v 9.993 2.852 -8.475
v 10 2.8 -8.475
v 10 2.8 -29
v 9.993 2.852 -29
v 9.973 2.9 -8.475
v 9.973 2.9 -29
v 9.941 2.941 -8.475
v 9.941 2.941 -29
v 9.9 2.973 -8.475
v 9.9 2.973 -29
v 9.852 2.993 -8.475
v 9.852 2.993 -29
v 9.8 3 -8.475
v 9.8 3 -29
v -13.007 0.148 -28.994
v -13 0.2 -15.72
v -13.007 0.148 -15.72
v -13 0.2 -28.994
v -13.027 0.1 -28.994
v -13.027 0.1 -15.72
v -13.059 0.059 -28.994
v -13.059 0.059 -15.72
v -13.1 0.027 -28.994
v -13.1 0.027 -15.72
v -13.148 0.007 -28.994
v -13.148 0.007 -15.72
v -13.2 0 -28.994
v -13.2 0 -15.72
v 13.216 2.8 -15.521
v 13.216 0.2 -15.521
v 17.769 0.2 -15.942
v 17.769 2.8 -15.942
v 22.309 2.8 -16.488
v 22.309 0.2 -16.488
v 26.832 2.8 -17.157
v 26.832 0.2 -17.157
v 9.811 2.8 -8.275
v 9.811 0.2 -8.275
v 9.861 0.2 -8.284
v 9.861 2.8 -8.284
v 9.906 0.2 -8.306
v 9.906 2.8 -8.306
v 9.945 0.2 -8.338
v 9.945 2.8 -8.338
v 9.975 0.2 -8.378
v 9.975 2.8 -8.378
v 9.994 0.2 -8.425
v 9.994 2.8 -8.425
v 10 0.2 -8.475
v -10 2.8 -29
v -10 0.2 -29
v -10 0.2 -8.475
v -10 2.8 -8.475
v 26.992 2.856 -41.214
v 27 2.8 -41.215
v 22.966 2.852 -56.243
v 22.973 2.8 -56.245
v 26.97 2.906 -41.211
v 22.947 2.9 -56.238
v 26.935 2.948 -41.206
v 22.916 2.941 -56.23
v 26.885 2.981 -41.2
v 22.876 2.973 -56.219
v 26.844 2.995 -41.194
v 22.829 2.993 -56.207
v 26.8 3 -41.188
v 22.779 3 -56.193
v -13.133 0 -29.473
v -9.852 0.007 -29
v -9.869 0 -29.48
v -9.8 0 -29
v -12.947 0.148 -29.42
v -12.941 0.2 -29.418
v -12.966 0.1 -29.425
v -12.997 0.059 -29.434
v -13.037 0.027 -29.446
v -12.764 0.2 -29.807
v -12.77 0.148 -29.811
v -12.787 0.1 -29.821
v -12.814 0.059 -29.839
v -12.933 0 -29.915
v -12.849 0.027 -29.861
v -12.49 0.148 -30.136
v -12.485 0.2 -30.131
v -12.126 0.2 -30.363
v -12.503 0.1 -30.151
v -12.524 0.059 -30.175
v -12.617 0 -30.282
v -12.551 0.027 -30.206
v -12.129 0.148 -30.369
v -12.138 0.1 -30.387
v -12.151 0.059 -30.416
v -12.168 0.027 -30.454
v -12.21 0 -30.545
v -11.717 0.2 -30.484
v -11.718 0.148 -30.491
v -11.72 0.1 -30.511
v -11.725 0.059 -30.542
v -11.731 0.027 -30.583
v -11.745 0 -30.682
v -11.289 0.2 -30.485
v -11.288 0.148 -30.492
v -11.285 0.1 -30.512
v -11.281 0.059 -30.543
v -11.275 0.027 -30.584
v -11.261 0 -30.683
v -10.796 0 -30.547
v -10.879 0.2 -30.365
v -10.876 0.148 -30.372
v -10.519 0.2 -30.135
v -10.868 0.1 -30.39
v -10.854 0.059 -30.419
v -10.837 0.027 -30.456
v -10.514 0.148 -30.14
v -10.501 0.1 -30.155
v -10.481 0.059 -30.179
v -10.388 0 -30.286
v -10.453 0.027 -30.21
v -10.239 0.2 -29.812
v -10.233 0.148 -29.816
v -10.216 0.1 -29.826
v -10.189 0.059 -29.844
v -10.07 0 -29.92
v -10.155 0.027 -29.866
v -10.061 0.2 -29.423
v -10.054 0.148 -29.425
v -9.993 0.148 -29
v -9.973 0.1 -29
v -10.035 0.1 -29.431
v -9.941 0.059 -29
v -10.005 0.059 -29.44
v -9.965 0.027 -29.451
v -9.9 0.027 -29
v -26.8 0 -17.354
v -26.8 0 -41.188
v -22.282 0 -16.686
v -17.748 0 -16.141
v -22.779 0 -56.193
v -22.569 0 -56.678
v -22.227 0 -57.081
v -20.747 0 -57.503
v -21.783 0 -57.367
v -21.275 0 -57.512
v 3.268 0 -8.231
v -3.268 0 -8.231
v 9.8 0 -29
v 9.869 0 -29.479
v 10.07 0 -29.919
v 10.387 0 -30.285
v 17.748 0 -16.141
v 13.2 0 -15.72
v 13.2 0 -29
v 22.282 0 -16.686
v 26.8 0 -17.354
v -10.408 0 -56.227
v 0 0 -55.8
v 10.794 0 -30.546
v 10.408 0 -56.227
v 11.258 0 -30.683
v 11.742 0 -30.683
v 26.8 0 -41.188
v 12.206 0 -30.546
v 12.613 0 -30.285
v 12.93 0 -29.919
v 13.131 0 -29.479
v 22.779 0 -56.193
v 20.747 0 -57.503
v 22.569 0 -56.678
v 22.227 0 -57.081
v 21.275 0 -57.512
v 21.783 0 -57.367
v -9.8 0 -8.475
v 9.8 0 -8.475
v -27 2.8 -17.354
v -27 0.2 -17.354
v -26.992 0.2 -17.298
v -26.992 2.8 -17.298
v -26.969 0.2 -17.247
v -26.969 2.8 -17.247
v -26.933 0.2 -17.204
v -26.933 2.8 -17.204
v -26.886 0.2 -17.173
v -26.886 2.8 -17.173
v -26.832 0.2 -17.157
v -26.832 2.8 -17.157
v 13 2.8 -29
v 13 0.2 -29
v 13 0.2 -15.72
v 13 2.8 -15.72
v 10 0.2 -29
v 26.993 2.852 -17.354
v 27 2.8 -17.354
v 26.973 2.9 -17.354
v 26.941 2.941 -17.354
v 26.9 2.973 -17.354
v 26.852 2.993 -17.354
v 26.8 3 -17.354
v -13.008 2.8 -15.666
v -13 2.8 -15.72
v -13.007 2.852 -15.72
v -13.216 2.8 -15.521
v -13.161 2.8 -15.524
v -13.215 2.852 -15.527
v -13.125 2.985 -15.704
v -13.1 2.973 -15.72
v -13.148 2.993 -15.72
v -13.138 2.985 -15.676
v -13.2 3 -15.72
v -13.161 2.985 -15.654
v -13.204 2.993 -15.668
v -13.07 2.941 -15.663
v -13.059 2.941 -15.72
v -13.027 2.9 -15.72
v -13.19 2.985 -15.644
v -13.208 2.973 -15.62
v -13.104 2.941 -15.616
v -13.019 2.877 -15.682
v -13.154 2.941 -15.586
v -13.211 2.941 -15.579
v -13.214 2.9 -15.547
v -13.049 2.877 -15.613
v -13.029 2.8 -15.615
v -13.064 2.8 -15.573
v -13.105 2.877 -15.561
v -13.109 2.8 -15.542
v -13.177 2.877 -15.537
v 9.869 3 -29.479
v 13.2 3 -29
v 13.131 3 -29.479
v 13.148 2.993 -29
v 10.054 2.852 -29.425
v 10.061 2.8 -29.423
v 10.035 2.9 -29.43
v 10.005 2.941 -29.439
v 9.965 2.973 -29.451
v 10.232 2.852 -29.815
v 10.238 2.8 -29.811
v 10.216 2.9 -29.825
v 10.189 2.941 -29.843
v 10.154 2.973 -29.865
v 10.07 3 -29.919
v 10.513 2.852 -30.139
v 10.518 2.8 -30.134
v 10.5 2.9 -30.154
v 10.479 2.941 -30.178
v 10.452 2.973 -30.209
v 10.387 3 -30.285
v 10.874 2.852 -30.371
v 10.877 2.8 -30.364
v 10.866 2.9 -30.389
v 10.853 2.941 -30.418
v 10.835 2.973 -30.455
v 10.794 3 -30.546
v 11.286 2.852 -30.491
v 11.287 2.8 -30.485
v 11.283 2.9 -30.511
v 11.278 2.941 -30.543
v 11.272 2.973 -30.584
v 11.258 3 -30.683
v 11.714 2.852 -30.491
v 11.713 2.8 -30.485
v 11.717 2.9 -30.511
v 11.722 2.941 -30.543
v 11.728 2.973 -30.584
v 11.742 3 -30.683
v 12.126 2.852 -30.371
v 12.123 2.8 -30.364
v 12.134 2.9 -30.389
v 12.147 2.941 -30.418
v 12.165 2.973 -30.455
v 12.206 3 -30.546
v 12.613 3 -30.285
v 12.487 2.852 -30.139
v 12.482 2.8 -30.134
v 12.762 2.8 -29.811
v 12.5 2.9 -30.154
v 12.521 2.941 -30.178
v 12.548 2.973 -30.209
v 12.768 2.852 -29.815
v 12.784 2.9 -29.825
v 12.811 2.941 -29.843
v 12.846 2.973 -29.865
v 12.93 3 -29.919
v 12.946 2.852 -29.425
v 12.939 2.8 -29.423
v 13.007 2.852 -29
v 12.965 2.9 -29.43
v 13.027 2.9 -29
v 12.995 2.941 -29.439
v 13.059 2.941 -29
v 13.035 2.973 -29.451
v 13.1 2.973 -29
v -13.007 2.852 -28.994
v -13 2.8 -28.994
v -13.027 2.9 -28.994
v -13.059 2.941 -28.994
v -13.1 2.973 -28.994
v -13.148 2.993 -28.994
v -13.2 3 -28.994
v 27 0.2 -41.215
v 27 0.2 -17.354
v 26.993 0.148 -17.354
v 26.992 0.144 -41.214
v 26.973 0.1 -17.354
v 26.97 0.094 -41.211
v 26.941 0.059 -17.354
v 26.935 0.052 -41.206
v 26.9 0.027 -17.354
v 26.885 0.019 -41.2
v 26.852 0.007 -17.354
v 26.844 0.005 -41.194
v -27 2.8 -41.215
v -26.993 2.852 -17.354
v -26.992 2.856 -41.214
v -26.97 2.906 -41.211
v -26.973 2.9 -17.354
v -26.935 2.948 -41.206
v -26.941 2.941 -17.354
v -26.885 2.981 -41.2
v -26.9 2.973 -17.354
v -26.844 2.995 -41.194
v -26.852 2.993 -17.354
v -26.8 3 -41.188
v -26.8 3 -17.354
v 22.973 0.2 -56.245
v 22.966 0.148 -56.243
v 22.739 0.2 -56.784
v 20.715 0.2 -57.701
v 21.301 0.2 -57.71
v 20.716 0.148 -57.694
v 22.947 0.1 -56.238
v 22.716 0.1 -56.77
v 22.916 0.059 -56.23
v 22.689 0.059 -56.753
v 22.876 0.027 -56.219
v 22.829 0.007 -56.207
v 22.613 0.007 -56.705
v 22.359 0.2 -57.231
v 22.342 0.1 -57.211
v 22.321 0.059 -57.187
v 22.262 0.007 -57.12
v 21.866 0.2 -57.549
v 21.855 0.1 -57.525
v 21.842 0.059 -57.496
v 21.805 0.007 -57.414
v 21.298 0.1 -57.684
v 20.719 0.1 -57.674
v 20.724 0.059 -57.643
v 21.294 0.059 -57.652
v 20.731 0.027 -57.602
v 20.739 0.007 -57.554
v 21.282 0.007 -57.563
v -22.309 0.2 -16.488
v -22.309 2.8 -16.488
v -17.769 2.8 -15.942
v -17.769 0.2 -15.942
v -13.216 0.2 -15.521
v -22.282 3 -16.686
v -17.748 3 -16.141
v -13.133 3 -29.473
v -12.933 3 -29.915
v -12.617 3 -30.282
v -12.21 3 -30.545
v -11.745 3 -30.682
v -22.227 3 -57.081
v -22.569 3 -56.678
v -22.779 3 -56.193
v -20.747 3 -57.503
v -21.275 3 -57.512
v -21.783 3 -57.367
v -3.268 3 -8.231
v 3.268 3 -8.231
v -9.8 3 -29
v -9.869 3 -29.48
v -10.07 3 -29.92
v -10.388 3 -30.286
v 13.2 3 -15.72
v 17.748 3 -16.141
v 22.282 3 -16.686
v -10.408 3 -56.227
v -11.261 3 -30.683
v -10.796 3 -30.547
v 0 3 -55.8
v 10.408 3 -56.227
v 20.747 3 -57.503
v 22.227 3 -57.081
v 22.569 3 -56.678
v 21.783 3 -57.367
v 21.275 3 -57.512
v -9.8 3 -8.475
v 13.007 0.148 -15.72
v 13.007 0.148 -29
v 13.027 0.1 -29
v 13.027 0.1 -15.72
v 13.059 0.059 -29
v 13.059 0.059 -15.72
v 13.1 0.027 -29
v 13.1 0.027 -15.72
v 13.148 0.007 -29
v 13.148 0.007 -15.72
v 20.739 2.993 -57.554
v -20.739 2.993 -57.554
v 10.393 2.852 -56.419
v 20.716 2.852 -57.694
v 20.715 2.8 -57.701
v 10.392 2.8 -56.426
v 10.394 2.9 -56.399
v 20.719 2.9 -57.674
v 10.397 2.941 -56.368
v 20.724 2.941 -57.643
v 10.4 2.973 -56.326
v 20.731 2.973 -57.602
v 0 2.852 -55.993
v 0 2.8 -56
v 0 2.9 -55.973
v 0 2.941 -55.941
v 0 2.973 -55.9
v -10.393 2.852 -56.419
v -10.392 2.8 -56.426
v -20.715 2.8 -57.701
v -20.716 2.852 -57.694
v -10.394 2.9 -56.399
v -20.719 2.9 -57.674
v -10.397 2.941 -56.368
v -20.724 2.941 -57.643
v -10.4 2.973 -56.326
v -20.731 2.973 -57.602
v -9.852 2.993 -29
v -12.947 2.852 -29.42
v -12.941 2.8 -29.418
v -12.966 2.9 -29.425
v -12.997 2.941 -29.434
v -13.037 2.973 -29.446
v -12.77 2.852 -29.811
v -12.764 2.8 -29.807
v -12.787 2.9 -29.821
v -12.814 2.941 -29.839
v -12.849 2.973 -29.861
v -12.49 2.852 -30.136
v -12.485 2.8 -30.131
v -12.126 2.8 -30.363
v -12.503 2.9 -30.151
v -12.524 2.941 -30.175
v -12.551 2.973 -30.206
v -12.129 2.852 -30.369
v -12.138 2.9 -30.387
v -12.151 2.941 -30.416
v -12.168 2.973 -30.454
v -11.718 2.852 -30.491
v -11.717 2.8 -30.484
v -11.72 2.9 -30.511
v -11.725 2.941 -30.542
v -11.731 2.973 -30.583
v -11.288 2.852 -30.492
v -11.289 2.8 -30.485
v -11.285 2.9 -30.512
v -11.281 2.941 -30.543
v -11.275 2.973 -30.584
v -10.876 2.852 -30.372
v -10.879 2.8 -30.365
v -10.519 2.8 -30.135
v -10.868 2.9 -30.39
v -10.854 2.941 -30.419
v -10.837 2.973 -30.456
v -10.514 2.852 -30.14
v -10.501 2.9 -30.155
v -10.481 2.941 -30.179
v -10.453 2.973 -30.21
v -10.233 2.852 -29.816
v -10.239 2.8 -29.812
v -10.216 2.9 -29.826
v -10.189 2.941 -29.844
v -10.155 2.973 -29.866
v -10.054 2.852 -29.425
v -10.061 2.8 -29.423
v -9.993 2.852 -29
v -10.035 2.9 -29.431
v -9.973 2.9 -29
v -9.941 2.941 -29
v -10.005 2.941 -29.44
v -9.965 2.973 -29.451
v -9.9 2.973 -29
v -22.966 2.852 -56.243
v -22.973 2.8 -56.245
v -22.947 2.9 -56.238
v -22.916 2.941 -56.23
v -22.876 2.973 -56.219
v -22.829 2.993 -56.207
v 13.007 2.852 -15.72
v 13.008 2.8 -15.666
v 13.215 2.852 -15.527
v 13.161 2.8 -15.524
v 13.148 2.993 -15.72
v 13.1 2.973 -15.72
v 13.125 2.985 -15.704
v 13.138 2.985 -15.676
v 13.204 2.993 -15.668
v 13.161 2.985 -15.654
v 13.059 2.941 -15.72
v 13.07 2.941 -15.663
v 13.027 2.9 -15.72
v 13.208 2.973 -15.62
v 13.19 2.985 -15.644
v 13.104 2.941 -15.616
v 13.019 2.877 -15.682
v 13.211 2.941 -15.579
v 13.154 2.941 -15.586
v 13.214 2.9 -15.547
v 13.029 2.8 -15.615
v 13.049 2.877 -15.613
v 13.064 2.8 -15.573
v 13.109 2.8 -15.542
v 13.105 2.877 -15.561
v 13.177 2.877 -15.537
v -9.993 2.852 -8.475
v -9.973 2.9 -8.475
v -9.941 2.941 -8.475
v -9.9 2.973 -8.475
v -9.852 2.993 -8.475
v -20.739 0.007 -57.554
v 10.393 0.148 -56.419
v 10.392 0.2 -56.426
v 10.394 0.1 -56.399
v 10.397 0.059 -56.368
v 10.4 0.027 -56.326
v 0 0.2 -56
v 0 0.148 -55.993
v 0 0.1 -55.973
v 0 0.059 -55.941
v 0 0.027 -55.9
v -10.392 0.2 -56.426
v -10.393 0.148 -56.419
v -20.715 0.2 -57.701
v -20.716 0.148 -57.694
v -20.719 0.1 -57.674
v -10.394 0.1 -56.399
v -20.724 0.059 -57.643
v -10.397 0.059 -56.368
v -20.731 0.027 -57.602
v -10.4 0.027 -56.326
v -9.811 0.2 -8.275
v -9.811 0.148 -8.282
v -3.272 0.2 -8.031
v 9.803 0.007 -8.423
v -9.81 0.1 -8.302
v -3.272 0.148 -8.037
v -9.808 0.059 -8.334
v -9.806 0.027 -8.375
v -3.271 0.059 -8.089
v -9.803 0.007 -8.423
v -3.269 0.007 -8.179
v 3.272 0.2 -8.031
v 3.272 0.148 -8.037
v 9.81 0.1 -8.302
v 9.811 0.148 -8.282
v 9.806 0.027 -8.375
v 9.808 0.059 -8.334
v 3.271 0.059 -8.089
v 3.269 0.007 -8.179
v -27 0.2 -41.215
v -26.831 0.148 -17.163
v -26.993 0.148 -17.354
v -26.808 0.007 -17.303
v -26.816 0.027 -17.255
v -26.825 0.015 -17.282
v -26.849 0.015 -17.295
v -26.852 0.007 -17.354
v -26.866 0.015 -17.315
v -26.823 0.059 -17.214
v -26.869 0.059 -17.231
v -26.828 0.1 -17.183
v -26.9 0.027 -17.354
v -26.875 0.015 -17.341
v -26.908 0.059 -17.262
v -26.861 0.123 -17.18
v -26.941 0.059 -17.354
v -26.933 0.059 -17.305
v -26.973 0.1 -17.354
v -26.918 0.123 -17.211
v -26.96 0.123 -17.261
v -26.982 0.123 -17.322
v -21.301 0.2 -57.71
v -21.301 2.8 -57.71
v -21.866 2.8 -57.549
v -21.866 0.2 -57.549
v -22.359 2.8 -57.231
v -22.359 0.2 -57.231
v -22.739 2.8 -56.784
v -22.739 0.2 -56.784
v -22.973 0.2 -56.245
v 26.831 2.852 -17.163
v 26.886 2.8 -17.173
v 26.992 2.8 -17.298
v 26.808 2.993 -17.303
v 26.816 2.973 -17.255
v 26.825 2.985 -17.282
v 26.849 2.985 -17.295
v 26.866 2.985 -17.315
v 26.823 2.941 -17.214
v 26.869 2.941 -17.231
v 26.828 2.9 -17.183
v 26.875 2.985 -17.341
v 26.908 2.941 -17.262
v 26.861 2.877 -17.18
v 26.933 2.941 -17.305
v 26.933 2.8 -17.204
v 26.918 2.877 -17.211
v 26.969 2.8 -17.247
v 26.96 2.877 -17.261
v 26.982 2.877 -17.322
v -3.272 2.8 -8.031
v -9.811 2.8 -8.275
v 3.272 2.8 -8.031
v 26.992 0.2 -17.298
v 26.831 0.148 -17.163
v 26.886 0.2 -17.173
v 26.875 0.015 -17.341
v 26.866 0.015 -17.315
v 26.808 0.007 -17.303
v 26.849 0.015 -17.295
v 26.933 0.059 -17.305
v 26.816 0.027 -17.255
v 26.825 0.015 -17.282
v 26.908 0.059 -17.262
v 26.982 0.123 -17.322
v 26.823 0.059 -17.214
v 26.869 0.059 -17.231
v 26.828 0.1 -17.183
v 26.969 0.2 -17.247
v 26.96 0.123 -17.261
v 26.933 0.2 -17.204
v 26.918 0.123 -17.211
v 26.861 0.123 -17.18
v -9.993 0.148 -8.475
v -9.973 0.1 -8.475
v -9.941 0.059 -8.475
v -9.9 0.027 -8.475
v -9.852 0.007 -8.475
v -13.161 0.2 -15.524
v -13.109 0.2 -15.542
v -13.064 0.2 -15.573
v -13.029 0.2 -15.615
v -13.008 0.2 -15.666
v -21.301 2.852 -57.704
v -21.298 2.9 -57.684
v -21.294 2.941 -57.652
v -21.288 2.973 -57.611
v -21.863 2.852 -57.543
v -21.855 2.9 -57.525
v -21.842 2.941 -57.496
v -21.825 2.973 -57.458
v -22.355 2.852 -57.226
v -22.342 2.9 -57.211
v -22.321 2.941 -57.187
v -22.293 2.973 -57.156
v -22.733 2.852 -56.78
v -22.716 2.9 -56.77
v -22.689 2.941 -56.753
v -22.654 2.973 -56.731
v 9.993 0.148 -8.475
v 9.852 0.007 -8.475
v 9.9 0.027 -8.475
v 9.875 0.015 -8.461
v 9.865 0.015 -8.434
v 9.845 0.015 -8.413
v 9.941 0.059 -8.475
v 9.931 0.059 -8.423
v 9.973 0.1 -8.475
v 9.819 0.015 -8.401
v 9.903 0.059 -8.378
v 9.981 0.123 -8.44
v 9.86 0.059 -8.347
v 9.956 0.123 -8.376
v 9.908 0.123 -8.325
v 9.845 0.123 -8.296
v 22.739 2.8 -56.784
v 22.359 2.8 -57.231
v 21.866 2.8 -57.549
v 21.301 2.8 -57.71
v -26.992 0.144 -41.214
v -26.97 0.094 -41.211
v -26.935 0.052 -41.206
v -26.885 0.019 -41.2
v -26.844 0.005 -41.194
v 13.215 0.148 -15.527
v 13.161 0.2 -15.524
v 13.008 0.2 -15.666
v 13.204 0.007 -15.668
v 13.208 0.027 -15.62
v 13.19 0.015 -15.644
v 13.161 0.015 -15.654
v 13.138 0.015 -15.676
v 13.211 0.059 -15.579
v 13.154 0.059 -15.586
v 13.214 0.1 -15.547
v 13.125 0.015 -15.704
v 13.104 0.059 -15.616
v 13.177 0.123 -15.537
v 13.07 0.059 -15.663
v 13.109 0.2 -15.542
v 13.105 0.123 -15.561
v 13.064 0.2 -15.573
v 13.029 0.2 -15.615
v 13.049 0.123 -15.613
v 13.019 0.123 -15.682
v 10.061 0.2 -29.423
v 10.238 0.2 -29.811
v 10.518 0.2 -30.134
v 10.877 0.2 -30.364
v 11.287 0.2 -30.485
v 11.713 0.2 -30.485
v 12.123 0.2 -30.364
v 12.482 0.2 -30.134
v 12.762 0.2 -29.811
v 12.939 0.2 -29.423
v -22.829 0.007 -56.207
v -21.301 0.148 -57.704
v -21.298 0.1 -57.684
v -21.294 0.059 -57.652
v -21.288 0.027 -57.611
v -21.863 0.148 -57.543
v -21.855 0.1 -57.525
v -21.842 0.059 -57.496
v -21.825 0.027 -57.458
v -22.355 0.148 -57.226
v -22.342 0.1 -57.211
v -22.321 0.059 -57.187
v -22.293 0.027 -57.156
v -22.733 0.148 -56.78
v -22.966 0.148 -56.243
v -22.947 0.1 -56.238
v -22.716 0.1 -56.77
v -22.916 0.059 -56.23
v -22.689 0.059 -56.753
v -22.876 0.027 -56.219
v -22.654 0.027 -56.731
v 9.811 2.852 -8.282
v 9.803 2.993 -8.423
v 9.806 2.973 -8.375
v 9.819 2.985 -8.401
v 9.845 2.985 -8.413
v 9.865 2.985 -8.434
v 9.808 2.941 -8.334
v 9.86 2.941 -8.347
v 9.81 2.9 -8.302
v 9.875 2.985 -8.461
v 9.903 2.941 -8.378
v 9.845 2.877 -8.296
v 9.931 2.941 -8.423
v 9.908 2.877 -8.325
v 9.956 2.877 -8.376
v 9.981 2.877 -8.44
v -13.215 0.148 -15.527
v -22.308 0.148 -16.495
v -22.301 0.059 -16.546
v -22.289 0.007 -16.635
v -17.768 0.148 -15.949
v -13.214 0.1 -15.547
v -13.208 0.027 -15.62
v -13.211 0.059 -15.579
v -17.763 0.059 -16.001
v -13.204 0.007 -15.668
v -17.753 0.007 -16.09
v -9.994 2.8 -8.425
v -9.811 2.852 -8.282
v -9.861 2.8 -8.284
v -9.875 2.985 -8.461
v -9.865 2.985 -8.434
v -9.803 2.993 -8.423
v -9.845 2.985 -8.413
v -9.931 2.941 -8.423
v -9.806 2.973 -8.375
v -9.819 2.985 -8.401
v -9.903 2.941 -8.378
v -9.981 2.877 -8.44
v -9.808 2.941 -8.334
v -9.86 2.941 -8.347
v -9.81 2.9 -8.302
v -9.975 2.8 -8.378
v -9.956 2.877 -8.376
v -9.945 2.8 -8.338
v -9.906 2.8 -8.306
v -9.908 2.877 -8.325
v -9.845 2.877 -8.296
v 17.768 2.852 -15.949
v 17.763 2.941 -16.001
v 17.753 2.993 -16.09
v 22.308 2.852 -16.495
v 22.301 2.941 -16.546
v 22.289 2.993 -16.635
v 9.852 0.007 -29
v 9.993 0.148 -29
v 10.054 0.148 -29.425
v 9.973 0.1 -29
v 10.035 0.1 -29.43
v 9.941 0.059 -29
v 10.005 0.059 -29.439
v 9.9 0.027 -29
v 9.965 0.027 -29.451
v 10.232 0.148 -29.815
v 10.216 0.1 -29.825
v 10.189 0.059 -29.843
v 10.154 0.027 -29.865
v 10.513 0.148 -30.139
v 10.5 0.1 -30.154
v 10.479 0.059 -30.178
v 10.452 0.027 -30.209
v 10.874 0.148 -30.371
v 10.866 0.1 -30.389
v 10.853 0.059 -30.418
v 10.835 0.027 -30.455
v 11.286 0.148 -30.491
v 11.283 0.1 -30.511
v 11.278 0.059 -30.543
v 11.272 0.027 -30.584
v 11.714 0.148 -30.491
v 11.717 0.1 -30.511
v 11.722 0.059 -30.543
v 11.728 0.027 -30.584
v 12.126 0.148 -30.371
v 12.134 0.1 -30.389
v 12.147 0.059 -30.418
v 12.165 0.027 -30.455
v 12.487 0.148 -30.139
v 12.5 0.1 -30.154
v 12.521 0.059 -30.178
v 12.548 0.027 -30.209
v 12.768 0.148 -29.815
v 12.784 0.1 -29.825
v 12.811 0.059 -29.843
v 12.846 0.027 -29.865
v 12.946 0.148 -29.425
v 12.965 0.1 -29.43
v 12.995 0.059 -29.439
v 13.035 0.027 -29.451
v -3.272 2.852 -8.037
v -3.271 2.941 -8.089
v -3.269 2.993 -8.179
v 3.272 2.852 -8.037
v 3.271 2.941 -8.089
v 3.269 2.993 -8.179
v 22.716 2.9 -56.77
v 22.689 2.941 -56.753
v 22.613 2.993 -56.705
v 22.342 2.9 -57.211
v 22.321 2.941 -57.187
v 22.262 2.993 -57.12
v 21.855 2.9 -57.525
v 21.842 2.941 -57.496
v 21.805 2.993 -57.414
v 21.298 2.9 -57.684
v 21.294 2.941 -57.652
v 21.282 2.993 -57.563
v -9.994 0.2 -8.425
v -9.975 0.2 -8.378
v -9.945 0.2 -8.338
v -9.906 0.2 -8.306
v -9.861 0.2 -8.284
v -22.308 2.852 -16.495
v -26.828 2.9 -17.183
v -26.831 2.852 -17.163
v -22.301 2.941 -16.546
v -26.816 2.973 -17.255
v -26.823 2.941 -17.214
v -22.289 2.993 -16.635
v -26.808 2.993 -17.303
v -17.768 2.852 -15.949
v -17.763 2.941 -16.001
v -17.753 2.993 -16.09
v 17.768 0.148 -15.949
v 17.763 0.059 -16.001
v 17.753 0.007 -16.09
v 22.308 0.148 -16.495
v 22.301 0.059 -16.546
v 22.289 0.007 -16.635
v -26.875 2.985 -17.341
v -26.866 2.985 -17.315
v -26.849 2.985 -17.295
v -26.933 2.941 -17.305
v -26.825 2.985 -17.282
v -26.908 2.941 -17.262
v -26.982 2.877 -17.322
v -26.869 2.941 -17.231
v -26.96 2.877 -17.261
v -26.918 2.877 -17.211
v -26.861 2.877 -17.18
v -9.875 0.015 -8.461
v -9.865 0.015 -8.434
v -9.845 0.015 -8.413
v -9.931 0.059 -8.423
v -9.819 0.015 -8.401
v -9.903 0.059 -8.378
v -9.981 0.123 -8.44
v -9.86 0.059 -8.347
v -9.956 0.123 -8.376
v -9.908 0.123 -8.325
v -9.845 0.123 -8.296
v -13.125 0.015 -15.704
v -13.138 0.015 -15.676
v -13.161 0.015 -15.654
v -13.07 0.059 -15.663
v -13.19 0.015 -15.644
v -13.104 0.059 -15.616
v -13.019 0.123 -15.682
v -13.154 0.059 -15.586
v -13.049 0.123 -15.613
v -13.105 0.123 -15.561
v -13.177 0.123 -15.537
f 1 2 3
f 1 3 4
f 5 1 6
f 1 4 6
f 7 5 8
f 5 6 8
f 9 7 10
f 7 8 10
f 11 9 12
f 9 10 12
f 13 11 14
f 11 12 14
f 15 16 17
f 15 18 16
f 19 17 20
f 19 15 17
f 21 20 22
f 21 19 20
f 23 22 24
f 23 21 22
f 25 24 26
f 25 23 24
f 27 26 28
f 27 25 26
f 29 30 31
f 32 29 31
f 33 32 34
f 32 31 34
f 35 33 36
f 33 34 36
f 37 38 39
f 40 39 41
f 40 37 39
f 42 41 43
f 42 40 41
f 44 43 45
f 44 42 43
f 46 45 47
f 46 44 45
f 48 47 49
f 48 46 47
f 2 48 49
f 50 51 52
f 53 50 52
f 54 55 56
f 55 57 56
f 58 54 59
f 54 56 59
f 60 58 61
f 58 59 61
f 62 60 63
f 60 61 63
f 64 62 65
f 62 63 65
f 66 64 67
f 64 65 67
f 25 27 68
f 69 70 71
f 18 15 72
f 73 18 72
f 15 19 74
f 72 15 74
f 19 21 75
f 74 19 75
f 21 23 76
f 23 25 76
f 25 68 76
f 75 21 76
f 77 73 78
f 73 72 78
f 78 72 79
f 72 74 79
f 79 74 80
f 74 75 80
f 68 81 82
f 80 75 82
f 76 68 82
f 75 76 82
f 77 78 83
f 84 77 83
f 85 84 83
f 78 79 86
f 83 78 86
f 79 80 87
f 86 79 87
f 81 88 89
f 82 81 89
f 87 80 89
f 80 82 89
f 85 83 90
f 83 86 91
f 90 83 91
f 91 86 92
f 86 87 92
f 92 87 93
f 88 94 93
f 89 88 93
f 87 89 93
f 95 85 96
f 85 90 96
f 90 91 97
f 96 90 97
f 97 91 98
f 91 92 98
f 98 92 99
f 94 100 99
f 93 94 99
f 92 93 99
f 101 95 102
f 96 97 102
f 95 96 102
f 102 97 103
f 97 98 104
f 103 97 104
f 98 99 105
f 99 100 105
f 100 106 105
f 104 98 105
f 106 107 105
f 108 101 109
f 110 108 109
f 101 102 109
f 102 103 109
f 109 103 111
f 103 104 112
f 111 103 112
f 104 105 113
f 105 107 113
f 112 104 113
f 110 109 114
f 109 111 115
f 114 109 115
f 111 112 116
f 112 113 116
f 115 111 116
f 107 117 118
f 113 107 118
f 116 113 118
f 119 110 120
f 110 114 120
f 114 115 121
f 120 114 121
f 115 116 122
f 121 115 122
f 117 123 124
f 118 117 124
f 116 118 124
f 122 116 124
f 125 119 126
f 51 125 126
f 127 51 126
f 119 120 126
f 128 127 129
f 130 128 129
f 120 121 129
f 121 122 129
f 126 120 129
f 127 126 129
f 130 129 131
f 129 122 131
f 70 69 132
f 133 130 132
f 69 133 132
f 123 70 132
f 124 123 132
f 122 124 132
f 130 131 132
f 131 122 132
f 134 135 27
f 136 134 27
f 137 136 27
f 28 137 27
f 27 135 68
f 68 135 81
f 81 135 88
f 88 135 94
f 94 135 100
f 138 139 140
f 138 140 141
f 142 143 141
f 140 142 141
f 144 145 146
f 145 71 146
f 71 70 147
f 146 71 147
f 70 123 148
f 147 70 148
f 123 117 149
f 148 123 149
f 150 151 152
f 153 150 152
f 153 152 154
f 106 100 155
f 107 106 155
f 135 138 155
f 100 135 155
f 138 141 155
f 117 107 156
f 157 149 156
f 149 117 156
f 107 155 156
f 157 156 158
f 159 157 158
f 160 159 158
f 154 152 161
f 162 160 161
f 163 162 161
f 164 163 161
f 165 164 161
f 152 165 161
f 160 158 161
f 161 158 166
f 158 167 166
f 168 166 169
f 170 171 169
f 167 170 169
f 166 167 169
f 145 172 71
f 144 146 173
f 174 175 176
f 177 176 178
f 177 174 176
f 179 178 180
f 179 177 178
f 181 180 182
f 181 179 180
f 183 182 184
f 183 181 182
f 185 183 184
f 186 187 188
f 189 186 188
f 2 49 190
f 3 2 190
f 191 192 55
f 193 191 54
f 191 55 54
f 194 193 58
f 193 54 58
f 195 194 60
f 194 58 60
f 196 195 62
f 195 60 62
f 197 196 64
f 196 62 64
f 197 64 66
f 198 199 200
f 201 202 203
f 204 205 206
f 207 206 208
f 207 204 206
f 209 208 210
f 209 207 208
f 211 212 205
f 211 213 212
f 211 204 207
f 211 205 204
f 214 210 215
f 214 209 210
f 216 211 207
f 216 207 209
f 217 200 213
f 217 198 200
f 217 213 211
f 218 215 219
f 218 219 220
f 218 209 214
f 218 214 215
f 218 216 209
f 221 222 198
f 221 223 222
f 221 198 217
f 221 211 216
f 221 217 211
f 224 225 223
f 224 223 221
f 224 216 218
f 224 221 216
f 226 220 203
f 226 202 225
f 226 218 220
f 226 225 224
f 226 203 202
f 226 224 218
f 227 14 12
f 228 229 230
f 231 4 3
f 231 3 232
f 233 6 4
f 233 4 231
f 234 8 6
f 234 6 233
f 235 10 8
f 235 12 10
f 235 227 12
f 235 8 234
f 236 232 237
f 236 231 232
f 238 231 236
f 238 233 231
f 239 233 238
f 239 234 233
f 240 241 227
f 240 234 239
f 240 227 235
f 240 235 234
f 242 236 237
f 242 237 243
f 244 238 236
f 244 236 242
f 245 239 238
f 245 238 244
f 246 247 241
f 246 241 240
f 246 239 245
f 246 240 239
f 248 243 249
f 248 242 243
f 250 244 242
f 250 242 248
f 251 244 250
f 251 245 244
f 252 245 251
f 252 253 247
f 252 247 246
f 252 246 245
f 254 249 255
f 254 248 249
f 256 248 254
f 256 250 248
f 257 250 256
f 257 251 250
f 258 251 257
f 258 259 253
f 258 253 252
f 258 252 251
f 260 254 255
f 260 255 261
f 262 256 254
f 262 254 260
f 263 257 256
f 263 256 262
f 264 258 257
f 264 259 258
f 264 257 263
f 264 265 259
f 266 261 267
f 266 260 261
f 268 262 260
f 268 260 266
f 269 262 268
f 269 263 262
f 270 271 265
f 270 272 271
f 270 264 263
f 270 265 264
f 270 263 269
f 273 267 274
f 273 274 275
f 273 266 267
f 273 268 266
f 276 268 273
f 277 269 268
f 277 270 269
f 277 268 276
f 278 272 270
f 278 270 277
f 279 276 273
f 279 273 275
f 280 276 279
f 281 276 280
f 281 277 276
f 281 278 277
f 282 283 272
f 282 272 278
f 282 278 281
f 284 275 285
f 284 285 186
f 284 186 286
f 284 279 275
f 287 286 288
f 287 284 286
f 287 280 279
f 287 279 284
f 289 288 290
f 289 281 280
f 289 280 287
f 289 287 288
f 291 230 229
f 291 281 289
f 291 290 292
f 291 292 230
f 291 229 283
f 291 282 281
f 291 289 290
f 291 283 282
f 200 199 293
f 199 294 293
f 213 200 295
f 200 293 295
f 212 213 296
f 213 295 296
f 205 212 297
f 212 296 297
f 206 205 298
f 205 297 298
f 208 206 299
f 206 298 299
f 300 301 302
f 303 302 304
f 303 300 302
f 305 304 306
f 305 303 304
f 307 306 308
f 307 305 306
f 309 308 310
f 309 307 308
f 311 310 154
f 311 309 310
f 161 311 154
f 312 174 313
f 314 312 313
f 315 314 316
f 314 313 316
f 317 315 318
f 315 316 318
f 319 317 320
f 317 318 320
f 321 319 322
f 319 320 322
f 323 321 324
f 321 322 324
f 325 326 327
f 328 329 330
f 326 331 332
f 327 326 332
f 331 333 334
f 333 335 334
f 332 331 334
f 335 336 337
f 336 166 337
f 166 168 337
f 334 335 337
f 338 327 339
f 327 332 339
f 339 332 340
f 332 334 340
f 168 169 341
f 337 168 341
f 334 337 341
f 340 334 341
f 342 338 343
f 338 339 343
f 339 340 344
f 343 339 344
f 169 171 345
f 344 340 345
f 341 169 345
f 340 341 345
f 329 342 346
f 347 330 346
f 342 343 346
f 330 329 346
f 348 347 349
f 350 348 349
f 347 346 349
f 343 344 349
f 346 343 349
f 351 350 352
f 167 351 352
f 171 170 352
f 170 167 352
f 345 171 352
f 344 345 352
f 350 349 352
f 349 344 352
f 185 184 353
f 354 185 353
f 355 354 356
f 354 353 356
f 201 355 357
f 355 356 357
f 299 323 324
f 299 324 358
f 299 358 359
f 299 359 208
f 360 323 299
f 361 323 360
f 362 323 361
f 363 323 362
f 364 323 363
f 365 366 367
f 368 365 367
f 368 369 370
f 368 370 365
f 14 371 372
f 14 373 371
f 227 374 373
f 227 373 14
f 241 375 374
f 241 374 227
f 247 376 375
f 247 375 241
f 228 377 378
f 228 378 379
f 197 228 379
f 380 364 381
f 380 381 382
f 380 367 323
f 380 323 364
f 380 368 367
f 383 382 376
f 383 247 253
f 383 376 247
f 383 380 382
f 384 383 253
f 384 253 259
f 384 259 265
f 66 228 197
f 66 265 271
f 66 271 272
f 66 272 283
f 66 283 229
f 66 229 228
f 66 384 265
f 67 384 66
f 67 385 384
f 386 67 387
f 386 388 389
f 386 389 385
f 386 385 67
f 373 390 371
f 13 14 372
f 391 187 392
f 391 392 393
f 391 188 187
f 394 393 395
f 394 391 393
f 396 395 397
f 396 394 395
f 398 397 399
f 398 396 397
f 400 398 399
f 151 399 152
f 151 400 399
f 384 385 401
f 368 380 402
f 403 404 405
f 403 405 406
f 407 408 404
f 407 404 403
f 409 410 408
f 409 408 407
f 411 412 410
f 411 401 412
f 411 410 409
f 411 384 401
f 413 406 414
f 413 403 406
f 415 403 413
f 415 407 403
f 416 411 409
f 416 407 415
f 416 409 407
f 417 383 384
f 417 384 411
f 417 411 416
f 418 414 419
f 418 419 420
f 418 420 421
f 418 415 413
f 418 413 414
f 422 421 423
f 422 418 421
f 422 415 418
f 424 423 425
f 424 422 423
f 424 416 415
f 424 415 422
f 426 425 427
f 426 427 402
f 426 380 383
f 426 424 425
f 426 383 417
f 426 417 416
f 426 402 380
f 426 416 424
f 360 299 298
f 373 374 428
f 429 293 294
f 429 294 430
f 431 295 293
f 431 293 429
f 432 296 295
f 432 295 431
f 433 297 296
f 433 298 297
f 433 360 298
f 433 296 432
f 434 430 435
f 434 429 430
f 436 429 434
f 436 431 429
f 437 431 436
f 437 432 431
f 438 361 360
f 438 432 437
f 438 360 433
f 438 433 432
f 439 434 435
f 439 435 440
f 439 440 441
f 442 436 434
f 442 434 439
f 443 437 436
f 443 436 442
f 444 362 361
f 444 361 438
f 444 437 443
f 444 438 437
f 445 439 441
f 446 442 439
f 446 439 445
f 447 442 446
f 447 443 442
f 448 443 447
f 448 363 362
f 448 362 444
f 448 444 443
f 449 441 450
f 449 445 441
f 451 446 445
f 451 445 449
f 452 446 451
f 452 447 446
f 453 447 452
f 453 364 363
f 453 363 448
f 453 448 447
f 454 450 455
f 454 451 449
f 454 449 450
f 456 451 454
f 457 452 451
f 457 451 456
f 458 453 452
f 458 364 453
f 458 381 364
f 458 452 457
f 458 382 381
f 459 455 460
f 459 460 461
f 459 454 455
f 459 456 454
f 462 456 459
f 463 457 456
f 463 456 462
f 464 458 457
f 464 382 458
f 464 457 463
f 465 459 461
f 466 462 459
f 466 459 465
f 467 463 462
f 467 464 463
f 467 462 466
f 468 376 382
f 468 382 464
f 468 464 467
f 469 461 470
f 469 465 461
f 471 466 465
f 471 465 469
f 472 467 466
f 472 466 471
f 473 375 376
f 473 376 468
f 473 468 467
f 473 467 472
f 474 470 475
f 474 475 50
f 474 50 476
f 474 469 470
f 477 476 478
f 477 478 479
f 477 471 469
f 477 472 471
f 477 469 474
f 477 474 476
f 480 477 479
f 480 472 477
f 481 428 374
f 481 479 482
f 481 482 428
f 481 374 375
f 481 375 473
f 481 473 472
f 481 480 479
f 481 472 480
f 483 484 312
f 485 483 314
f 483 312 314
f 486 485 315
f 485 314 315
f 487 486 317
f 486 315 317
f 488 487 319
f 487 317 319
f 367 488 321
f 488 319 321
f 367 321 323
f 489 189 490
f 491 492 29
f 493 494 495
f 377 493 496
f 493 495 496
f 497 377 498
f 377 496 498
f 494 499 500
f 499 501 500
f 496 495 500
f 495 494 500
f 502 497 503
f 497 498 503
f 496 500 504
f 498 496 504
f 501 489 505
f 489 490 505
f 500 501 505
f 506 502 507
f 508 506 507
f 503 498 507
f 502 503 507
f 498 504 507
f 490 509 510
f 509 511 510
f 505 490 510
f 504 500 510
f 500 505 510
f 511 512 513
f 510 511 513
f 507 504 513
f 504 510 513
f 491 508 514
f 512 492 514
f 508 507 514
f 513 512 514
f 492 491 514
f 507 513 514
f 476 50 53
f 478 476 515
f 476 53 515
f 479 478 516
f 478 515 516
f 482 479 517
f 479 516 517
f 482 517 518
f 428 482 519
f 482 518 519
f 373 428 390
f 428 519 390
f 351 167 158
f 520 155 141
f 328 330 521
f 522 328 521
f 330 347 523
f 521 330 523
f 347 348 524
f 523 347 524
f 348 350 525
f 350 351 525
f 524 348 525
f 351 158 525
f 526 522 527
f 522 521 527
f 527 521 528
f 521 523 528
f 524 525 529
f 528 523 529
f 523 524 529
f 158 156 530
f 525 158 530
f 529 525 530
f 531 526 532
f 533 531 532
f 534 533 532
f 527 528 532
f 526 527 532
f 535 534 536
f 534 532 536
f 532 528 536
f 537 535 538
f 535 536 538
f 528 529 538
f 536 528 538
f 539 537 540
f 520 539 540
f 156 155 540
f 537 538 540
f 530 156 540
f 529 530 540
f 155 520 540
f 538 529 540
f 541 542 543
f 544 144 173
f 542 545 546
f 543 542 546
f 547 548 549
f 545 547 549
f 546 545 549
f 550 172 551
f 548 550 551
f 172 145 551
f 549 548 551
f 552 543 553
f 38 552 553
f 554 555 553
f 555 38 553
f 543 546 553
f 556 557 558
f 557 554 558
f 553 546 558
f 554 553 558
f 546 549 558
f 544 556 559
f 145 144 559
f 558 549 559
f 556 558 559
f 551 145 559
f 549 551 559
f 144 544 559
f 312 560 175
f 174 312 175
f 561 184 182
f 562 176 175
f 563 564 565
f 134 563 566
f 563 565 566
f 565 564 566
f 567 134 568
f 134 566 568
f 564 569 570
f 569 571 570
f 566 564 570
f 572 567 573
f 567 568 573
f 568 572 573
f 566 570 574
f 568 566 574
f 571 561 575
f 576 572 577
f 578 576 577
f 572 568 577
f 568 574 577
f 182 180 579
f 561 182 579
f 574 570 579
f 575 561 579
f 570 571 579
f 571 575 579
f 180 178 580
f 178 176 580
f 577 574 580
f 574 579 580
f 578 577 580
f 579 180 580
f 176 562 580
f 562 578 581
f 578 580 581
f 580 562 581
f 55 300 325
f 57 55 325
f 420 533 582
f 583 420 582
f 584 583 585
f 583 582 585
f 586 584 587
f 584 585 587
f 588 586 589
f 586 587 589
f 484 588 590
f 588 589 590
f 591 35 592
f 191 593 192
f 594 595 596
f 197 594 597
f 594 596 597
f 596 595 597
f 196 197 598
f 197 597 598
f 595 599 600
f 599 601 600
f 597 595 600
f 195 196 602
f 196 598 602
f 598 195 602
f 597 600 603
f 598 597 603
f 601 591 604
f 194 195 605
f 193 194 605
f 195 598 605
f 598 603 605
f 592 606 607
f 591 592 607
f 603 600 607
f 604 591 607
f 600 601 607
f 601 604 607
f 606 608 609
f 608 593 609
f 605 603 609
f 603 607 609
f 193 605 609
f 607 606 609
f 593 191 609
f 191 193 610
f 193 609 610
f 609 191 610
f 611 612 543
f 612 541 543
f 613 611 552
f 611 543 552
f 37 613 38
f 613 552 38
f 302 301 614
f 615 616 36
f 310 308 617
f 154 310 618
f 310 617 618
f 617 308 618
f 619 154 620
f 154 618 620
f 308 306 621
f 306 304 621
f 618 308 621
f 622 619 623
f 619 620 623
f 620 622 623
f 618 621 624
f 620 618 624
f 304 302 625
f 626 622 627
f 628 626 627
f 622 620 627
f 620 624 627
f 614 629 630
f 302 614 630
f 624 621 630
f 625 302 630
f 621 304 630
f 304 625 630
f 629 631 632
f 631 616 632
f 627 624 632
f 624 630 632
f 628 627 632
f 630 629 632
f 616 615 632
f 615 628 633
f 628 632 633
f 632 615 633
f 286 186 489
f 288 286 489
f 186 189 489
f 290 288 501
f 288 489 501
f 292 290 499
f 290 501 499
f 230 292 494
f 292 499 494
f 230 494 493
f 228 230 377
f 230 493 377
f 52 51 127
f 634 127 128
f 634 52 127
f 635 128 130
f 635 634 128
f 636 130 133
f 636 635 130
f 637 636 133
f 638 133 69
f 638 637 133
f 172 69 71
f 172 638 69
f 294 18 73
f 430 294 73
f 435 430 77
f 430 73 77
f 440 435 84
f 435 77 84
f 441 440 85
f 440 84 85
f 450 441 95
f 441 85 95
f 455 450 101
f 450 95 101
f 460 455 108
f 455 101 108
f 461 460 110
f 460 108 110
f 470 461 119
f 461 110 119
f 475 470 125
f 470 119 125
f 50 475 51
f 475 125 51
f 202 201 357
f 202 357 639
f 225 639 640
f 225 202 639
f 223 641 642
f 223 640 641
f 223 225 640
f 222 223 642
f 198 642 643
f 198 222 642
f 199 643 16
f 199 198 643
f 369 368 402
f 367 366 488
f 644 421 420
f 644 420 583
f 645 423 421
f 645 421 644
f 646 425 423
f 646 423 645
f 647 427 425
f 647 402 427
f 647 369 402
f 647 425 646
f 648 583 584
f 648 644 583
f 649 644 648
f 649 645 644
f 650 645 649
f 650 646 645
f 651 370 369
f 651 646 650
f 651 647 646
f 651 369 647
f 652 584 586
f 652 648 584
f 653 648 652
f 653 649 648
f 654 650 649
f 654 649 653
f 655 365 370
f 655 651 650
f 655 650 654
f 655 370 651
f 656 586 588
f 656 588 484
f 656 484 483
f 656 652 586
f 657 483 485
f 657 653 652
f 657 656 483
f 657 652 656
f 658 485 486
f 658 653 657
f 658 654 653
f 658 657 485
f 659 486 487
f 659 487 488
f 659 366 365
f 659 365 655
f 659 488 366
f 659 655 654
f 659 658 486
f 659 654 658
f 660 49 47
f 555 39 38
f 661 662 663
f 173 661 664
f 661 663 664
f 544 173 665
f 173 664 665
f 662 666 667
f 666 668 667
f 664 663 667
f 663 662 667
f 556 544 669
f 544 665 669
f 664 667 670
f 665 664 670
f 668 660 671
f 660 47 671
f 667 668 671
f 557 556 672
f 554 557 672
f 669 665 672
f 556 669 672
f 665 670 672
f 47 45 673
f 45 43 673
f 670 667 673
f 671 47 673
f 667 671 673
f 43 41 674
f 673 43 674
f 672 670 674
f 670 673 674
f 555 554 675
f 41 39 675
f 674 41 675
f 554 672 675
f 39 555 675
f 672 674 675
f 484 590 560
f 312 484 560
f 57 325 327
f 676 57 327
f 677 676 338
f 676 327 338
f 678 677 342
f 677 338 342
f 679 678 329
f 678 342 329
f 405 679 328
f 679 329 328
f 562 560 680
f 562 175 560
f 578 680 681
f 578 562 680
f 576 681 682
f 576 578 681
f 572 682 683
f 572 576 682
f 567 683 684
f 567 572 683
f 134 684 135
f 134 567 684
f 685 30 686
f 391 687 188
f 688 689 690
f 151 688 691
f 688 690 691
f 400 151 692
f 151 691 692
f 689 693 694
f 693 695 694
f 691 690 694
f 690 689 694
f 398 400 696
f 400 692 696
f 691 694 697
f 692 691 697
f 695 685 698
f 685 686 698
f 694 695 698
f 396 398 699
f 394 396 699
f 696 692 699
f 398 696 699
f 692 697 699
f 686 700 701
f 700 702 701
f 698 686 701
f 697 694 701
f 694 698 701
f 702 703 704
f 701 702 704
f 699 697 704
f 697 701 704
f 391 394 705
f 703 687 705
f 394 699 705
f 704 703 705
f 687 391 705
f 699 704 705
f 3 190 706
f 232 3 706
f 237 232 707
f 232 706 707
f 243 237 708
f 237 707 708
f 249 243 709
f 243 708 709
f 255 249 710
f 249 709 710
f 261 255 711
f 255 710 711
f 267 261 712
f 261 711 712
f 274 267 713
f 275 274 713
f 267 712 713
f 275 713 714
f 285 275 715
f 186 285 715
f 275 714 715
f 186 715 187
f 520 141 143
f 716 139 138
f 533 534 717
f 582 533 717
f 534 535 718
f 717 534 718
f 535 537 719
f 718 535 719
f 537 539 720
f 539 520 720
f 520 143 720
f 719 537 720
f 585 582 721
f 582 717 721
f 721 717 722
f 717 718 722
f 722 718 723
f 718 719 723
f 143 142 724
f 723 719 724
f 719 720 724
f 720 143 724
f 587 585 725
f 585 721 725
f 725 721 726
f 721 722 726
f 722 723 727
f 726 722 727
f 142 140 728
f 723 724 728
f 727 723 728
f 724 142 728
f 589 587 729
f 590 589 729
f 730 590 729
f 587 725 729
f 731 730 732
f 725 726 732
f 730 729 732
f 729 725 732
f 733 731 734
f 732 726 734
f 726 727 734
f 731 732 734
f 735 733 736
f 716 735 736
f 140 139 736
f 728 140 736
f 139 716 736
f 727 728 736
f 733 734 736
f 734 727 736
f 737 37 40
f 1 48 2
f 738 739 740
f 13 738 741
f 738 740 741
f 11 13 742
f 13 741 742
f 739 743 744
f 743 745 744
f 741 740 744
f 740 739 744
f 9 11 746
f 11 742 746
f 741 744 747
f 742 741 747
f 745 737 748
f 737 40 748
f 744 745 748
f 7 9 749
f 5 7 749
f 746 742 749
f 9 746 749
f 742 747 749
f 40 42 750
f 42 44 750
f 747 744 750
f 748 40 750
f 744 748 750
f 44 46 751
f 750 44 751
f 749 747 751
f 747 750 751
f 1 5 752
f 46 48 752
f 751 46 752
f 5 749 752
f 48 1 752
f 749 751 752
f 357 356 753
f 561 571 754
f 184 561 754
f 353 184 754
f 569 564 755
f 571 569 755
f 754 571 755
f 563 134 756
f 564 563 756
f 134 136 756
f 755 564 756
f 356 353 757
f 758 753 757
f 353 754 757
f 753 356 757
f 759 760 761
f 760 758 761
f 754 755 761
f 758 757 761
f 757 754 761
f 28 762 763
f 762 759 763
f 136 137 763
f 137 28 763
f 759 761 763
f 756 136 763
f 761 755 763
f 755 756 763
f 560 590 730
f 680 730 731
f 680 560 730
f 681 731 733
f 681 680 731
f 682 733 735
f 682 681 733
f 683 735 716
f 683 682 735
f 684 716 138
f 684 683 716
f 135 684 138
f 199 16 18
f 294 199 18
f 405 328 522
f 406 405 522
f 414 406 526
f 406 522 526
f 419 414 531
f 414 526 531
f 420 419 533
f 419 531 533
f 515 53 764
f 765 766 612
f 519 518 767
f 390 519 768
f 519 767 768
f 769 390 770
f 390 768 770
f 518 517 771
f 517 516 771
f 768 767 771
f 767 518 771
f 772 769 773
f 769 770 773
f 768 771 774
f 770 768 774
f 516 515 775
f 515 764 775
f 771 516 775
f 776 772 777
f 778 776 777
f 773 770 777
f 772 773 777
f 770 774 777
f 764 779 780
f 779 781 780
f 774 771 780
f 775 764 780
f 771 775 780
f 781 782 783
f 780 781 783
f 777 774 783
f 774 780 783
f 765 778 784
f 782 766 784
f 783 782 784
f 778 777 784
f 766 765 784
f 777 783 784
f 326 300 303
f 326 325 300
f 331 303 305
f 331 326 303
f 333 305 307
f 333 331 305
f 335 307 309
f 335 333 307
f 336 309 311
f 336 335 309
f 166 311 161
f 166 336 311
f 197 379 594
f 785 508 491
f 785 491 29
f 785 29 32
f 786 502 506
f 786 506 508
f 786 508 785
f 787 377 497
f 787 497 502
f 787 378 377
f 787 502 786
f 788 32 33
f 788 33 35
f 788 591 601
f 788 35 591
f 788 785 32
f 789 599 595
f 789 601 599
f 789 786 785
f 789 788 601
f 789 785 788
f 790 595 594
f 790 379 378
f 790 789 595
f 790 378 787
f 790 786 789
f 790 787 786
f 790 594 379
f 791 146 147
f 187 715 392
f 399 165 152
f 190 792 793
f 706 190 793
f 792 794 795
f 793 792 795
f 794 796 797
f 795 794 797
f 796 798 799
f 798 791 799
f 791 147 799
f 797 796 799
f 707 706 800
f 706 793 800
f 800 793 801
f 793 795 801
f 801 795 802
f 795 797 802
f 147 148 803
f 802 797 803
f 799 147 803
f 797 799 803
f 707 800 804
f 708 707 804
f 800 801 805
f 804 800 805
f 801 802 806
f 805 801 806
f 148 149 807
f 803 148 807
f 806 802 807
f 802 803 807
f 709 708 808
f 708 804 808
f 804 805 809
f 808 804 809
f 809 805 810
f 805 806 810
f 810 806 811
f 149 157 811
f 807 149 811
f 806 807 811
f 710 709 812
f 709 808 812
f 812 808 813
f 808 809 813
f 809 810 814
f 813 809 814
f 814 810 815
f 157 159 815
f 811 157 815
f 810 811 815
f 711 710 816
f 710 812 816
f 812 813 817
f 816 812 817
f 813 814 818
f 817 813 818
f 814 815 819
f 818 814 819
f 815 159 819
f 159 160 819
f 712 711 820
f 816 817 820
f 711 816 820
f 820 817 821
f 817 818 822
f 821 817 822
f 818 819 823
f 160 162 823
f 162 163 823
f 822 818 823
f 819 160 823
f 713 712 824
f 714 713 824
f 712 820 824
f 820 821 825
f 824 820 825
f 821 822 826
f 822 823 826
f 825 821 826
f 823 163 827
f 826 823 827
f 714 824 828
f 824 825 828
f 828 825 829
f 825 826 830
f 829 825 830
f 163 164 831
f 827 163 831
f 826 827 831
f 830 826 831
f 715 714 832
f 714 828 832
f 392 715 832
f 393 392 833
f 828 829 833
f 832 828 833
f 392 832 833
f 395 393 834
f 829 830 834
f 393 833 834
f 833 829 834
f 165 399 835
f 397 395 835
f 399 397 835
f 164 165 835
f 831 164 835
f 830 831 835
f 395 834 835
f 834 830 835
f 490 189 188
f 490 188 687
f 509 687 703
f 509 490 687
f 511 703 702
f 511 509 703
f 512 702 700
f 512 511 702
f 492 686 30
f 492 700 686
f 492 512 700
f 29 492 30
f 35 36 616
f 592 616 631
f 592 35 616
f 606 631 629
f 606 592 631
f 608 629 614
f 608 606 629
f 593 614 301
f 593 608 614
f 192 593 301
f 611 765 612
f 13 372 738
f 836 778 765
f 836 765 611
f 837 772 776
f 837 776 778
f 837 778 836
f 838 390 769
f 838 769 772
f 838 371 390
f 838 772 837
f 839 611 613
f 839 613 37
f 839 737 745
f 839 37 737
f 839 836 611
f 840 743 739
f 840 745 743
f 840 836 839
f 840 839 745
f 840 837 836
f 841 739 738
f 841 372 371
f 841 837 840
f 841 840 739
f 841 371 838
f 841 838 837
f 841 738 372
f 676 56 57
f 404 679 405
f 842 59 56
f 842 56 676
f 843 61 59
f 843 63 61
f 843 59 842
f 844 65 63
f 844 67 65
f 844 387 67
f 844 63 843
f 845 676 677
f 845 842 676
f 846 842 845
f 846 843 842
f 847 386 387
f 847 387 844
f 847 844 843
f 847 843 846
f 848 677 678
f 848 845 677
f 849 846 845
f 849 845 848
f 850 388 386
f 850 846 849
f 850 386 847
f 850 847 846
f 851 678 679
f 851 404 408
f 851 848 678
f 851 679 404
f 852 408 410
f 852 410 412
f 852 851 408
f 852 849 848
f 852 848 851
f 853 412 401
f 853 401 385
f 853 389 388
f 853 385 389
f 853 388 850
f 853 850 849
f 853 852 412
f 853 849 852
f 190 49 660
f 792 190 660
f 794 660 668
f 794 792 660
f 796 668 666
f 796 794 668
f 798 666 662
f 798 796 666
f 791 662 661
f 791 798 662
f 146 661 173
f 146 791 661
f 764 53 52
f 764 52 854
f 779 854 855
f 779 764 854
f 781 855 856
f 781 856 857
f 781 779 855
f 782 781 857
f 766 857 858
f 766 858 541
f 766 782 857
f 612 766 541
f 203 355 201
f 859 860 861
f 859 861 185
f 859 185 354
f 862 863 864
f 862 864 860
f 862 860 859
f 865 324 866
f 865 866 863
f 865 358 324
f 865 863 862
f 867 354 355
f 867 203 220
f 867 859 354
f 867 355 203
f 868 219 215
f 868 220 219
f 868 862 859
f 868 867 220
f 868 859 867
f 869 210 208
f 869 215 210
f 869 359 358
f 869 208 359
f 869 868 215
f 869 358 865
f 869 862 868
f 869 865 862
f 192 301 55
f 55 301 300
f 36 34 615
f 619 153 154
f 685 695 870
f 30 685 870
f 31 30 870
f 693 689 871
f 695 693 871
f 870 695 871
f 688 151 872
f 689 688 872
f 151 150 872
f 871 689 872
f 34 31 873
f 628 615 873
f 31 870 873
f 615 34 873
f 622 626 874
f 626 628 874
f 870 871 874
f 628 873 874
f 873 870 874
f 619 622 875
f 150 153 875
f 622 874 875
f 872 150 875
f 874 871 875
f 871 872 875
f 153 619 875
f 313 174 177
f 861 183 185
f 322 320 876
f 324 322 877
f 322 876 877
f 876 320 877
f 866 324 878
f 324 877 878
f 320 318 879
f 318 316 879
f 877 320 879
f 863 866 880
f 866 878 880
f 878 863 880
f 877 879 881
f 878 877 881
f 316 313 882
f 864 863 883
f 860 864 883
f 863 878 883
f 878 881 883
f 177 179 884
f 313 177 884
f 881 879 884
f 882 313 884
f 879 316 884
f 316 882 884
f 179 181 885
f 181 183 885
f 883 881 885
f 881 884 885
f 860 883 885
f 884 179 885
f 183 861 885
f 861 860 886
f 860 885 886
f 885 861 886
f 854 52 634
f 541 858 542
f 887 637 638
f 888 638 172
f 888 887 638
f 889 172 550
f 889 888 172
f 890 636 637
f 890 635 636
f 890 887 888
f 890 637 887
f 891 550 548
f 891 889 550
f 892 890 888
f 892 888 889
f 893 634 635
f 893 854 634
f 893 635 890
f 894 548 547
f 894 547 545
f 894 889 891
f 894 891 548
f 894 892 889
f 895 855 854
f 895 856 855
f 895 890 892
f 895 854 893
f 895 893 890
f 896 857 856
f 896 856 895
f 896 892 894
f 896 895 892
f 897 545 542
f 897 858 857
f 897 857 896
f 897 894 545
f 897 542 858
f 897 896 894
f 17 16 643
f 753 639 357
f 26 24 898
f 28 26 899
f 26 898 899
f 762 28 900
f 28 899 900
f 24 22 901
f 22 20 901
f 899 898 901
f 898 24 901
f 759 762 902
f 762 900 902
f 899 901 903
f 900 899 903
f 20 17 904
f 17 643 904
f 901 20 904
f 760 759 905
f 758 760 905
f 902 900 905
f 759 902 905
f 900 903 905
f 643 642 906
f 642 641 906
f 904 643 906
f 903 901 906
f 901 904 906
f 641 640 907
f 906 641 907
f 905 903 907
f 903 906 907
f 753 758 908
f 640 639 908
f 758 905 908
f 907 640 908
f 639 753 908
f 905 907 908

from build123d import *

# Parameters (mm, degrees)
BOSS_EXTRUDE1_DEPTH = 3
FILLET1_R           = 0.2


with BuildPart() as part:
    # Sketch1 → Boss-Extrude1 (new body)
    with BuildSketch(Plane(origin=(0, 0, 0), x_dir=(1, 0, 0), z_dir=(0, 1, 0))):
        with BuildLine():
            Line((-10, 29), (-10, 8.285947903))
            ThreePointArc((-10, 8.285947903), (0, 8), (10, 8.285947903))
            Line((10, 8.285947903), (10, 29))
            ThreePointArc((10, 29), (11.5, 30.5), (13, 29))
            Line((13, 29), (13, 15.503731385))
            ThreePointArc((13, 15.503731385), (20.017634438, 16.196839624), (27, 17.183836735))
            Line((27, 17.183836735), (27, 41.21477169))
            Line((27, 41.21477169), (22.972622015, 56.245150951))
            ThreePointArc((22.972622015, 56.245150951), (22.124373546, 57.408525693), (20.714556868, 57.700729716))
            ThreePointArc((20.714556868, 57.700729716), (0, 56), (-20.714556868, 57.700729716))
            ThreePointArc((-20.714556868, 57.700729716), (-22.124373546, 57.408525693), (-22.972622015, 56.245150951))
            Line((-22.972622015, 56.245150951), (-27, 41.21477169))
            Line((-27, 41.21477169), (-27, 17.183836735))
            ThreePointArc((-27, 17.183836735), (-20.017634438, 16.196839624), (-13, 15.503731385))
            Line((-13, 15.503731385), (-13, 28.994346903))
            ThreePointArc((-13, 28.994346903), (-11.50283188, 30.500002663), (-10, 29))
        make_face()
    extrude(amount=BOSS_EXTRUDE1_DEPTH)

    # Fillet1
    fillet1_edges = [part.edges().sort_by_distance(p)[0] for p in [
        (0, 3, -8),
        (10, 3, -18.642973952),
        (-13, 0, -22.249039144),
        (-20.017634438, 0, -16.196839624),
        (-27, 0, -29.199304212),
        (-24.986311008, 0, -48.729961321),
        (-22.124373546, 0, -57.408525693),
        (11.5, 3, -30.5),
        (0, 0, -56),
        (22.124373546, 0, -57.408525693),
        (24.986311008, 0, -48.729961321),
        (27, 0, -29.199304212),
        (20.017634438, 0, -16.196839624),
        (13, 0, -22.251865692),
        (11.5, 0, -30.5),
        (10, 0, -18.642973952),
        (13, 3, -22.251865692),
        (0, 0, -8),
        (-10, 0, -18.642973952),
        (-11.50283188, 0, -30.500002663),
        (20.017634438, 3, -16.196839624),
        (27, 3, -29.199304212),
        (-13, 1.5, -15.503731385),
        (-27, 1.5, -17.183836735),
        (27, 1.5, -17.183836735),
        (13, 1.5, -15.503731385),
        (10, 1.5, -8.285947903),
        (-10, 1.5, -8.285947903),
        (24.986311008, 3, -48.729961321),
        (22.124373546, 3, -57.408525693),
        (0, 3, -56),
        (-22.124373546, 3, -57.408525693),
        (-11.50283188, 3, -30.500002663),
        (-24.986311008, 3, -48.729961321),
        (-27, 3, -29.199304212),
        (-20.017634438, 3, -16.196839624),
        (-13, 3, -22.249039144),
        (-10, 3, -18.642973952),
    ]]
    fillet(fillet1_edges, radius=FILLET1_R)


solid = part.part
